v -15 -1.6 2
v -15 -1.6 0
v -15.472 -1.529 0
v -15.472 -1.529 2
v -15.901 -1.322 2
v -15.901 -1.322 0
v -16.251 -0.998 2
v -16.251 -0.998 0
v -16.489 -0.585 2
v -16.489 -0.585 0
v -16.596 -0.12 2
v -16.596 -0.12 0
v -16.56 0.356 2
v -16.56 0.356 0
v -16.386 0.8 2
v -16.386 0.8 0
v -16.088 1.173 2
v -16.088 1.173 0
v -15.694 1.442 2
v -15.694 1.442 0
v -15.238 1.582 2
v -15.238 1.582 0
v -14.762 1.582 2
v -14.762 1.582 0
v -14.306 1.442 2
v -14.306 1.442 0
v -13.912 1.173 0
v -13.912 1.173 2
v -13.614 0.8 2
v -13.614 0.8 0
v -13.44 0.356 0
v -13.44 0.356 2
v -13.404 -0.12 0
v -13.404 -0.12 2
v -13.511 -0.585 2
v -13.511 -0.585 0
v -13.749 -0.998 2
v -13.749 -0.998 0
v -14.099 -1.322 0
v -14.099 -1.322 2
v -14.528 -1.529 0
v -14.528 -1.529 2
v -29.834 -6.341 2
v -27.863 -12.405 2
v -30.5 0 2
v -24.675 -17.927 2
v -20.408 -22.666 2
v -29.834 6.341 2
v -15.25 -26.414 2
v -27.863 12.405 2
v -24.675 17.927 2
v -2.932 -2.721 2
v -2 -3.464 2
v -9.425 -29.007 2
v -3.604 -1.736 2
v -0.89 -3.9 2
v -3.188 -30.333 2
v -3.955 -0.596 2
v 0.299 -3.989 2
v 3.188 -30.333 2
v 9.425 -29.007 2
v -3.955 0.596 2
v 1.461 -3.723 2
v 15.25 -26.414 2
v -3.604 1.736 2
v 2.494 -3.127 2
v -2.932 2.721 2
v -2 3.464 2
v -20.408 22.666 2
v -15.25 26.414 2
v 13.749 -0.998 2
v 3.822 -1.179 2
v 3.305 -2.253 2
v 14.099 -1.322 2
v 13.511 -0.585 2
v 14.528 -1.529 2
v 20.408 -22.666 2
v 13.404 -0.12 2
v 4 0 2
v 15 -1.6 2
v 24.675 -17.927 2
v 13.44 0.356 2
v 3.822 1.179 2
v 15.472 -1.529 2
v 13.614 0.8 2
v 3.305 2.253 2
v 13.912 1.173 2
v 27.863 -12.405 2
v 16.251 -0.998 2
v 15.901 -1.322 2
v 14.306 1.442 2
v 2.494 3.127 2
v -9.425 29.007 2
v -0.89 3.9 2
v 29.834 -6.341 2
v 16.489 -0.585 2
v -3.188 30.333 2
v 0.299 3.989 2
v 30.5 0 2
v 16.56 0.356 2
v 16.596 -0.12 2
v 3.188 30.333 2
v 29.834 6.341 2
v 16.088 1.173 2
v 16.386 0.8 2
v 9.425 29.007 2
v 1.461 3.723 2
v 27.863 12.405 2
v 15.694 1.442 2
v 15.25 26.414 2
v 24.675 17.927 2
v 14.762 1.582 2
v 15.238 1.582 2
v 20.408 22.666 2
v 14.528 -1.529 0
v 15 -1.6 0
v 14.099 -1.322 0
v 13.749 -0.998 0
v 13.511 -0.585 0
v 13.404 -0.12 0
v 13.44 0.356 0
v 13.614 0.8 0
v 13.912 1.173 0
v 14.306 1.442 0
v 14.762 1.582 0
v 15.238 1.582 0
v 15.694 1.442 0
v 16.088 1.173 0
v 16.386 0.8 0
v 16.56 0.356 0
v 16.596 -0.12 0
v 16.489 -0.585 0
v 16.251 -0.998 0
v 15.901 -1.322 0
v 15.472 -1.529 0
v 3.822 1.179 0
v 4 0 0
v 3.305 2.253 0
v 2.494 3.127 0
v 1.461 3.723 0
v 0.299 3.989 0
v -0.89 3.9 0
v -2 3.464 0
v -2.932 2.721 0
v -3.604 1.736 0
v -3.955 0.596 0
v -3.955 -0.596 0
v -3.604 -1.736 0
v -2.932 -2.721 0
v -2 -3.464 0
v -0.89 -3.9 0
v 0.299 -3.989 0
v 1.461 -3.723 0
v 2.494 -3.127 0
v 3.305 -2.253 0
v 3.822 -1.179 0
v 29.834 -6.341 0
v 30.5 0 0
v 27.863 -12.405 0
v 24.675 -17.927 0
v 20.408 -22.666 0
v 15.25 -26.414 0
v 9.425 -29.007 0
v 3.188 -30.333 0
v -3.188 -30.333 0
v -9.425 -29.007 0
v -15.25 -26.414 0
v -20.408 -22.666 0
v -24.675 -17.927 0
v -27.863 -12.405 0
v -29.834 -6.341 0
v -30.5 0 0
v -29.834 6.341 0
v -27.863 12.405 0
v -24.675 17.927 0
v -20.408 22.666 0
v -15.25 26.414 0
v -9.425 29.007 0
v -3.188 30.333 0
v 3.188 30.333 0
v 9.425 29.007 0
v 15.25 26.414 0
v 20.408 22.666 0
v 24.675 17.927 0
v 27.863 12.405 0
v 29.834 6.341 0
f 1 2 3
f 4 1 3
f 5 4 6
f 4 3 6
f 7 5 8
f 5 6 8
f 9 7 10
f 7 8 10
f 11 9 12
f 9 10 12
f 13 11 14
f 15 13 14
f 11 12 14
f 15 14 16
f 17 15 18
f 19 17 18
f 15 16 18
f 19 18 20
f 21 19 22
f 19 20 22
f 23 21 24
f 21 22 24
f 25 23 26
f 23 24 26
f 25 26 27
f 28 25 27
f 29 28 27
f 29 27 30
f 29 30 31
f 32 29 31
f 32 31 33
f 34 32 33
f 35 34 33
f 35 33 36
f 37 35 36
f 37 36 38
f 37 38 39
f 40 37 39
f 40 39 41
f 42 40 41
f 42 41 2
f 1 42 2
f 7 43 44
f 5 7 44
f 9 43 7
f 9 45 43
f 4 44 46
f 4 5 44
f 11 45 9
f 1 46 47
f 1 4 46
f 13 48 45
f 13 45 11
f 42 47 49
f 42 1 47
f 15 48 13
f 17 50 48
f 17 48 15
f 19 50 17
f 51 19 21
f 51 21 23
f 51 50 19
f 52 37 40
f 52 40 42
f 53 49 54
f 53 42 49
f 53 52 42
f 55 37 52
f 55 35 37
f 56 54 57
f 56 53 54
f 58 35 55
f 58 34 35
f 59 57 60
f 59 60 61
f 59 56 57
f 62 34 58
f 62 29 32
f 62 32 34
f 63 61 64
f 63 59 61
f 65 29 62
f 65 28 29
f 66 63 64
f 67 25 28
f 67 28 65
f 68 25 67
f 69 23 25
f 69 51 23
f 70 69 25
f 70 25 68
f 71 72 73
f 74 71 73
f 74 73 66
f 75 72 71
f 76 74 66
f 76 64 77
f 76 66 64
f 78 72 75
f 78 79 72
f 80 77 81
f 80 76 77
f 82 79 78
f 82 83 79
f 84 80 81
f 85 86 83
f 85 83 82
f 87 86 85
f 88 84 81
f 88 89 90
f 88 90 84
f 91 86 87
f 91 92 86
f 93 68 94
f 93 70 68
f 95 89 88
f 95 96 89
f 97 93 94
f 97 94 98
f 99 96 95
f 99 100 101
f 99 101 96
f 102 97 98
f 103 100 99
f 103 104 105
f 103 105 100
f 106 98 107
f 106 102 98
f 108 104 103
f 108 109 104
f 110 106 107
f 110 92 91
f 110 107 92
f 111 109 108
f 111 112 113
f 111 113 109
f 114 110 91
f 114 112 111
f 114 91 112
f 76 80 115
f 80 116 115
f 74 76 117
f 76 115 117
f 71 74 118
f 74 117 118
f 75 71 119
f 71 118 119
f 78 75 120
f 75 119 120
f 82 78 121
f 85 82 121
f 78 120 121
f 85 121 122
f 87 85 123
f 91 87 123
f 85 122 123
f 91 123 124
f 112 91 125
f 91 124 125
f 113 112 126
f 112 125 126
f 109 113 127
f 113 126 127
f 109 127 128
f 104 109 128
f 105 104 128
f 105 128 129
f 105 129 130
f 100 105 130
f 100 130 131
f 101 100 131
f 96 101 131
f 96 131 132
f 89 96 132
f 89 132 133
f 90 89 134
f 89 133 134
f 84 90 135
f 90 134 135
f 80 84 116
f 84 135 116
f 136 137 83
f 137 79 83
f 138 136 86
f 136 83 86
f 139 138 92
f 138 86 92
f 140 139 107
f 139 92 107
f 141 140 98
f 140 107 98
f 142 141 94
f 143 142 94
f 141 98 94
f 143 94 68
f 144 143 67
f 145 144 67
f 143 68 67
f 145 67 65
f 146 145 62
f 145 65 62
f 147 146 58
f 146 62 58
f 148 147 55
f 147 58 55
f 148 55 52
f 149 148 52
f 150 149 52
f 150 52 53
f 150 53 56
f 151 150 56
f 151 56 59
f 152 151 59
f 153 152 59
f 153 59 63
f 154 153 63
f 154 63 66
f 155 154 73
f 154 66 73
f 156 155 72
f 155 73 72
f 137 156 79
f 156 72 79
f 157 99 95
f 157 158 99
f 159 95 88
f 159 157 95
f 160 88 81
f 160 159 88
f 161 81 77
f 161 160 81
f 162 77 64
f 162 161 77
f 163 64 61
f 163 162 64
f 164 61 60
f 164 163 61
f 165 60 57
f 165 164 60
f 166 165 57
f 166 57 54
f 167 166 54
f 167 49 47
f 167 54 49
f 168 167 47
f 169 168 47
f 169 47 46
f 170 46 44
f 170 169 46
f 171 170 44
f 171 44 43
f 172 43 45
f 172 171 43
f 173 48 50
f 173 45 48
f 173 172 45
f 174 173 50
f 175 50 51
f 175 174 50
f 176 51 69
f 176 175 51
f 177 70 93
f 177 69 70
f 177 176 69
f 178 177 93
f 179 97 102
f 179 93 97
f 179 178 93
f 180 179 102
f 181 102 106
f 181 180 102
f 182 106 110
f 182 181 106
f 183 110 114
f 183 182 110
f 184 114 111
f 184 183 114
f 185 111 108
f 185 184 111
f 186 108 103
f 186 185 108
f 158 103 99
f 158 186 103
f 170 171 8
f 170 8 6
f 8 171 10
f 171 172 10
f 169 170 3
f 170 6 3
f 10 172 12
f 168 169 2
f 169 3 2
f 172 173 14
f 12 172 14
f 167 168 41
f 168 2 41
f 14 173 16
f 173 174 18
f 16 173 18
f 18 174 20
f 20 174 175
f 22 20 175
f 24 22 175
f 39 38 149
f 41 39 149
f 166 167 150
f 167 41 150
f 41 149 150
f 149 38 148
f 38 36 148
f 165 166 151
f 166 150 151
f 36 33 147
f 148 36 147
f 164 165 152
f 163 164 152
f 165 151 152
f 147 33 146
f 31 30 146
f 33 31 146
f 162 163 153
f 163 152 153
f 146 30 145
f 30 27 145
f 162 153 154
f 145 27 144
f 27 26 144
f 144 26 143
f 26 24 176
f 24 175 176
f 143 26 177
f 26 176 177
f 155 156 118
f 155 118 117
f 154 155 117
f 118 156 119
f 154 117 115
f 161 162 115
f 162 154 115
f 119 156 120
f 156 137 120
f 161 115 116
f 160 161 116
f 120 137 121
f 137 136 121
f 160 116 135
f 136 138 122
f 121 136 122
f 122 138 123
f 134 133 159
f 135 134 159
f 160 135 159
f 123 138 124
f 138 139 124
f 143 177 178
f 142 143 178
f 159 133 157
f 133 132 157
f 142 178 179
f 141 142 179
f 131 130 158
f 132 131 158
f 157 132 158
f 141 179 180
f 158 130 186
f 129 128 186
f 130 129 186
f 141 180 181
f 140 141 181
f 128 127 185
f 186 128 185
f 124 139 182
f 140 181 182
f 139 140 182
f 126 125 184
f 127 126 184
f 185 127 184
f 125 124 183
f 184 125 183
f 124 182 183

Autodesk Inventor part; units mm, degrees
ref_plane "YZ Plane" through (0, 0, 0) normal (1, 0, 0) x (0, 1, 0)
ref_plane "XZ Plane" through (0, 0, 0) normal (0, 1, 0) x (-1, 0, 0)
ref_plane "XY Plane" through (0, 0, 0) normal (0, 0, 1) x (1, 0, 0)
sketch "スケッチ1" plane through (0, 0, 0) normal (0, 0, 1) x (1, 0, 0)
  circle A0 centre (0, 0) radius 30.5
  dimension "d0" = 61
extrude "押し出し1" add sketch "スケッチ1" along normal blind 2
sketch "スケッチ2" plane through (0, 0, 2) normal (0, 0, 1) x (1, 0, 0)
  circle A0 centre (0, 0) radius 4
  dimension "d3" = 8
extrude "押し出し2" cut sketch "スケッチ2" against normal blind 2
sketch "スケッチ3" plane through (0, 0, 2) normal (0, 0, 1) x (1, 0, 0)
  circle A0 centre (-15, 0) radius 1.6
  circle A1 centre (15, 0) radius 1.6
  point P0 (0, 0)
  dimension "d6" = 3.2
  dimension "d7" = 3.2
  dimension "d8" = 15
  dimension "d9" = 15
hole "穴1" at (-15, 0, 2) at (15, 0, 2) direction (0, 0, -1) diameter 3.2 depth 2
equation "\"BendRadius\" = Thickness"
equation "\"BendReliefWidth\" = Thickness"
equation "\"BendReliefDepth\" = 0.5 * Thickness"
equation "\"CornerReliefSize\" = 4 * Thickness"
equation "\"MinimumRemnant\" = 2 * Thickness"
equation "\"TransitionRadius\" = BendRadius"
equation "\"JacobiRadiusSize\" = BendRadius"
equation "\"GapSize\" = Thickness"
equation "\"Thickness\" = 0.5"
properties part number "nhk36"
